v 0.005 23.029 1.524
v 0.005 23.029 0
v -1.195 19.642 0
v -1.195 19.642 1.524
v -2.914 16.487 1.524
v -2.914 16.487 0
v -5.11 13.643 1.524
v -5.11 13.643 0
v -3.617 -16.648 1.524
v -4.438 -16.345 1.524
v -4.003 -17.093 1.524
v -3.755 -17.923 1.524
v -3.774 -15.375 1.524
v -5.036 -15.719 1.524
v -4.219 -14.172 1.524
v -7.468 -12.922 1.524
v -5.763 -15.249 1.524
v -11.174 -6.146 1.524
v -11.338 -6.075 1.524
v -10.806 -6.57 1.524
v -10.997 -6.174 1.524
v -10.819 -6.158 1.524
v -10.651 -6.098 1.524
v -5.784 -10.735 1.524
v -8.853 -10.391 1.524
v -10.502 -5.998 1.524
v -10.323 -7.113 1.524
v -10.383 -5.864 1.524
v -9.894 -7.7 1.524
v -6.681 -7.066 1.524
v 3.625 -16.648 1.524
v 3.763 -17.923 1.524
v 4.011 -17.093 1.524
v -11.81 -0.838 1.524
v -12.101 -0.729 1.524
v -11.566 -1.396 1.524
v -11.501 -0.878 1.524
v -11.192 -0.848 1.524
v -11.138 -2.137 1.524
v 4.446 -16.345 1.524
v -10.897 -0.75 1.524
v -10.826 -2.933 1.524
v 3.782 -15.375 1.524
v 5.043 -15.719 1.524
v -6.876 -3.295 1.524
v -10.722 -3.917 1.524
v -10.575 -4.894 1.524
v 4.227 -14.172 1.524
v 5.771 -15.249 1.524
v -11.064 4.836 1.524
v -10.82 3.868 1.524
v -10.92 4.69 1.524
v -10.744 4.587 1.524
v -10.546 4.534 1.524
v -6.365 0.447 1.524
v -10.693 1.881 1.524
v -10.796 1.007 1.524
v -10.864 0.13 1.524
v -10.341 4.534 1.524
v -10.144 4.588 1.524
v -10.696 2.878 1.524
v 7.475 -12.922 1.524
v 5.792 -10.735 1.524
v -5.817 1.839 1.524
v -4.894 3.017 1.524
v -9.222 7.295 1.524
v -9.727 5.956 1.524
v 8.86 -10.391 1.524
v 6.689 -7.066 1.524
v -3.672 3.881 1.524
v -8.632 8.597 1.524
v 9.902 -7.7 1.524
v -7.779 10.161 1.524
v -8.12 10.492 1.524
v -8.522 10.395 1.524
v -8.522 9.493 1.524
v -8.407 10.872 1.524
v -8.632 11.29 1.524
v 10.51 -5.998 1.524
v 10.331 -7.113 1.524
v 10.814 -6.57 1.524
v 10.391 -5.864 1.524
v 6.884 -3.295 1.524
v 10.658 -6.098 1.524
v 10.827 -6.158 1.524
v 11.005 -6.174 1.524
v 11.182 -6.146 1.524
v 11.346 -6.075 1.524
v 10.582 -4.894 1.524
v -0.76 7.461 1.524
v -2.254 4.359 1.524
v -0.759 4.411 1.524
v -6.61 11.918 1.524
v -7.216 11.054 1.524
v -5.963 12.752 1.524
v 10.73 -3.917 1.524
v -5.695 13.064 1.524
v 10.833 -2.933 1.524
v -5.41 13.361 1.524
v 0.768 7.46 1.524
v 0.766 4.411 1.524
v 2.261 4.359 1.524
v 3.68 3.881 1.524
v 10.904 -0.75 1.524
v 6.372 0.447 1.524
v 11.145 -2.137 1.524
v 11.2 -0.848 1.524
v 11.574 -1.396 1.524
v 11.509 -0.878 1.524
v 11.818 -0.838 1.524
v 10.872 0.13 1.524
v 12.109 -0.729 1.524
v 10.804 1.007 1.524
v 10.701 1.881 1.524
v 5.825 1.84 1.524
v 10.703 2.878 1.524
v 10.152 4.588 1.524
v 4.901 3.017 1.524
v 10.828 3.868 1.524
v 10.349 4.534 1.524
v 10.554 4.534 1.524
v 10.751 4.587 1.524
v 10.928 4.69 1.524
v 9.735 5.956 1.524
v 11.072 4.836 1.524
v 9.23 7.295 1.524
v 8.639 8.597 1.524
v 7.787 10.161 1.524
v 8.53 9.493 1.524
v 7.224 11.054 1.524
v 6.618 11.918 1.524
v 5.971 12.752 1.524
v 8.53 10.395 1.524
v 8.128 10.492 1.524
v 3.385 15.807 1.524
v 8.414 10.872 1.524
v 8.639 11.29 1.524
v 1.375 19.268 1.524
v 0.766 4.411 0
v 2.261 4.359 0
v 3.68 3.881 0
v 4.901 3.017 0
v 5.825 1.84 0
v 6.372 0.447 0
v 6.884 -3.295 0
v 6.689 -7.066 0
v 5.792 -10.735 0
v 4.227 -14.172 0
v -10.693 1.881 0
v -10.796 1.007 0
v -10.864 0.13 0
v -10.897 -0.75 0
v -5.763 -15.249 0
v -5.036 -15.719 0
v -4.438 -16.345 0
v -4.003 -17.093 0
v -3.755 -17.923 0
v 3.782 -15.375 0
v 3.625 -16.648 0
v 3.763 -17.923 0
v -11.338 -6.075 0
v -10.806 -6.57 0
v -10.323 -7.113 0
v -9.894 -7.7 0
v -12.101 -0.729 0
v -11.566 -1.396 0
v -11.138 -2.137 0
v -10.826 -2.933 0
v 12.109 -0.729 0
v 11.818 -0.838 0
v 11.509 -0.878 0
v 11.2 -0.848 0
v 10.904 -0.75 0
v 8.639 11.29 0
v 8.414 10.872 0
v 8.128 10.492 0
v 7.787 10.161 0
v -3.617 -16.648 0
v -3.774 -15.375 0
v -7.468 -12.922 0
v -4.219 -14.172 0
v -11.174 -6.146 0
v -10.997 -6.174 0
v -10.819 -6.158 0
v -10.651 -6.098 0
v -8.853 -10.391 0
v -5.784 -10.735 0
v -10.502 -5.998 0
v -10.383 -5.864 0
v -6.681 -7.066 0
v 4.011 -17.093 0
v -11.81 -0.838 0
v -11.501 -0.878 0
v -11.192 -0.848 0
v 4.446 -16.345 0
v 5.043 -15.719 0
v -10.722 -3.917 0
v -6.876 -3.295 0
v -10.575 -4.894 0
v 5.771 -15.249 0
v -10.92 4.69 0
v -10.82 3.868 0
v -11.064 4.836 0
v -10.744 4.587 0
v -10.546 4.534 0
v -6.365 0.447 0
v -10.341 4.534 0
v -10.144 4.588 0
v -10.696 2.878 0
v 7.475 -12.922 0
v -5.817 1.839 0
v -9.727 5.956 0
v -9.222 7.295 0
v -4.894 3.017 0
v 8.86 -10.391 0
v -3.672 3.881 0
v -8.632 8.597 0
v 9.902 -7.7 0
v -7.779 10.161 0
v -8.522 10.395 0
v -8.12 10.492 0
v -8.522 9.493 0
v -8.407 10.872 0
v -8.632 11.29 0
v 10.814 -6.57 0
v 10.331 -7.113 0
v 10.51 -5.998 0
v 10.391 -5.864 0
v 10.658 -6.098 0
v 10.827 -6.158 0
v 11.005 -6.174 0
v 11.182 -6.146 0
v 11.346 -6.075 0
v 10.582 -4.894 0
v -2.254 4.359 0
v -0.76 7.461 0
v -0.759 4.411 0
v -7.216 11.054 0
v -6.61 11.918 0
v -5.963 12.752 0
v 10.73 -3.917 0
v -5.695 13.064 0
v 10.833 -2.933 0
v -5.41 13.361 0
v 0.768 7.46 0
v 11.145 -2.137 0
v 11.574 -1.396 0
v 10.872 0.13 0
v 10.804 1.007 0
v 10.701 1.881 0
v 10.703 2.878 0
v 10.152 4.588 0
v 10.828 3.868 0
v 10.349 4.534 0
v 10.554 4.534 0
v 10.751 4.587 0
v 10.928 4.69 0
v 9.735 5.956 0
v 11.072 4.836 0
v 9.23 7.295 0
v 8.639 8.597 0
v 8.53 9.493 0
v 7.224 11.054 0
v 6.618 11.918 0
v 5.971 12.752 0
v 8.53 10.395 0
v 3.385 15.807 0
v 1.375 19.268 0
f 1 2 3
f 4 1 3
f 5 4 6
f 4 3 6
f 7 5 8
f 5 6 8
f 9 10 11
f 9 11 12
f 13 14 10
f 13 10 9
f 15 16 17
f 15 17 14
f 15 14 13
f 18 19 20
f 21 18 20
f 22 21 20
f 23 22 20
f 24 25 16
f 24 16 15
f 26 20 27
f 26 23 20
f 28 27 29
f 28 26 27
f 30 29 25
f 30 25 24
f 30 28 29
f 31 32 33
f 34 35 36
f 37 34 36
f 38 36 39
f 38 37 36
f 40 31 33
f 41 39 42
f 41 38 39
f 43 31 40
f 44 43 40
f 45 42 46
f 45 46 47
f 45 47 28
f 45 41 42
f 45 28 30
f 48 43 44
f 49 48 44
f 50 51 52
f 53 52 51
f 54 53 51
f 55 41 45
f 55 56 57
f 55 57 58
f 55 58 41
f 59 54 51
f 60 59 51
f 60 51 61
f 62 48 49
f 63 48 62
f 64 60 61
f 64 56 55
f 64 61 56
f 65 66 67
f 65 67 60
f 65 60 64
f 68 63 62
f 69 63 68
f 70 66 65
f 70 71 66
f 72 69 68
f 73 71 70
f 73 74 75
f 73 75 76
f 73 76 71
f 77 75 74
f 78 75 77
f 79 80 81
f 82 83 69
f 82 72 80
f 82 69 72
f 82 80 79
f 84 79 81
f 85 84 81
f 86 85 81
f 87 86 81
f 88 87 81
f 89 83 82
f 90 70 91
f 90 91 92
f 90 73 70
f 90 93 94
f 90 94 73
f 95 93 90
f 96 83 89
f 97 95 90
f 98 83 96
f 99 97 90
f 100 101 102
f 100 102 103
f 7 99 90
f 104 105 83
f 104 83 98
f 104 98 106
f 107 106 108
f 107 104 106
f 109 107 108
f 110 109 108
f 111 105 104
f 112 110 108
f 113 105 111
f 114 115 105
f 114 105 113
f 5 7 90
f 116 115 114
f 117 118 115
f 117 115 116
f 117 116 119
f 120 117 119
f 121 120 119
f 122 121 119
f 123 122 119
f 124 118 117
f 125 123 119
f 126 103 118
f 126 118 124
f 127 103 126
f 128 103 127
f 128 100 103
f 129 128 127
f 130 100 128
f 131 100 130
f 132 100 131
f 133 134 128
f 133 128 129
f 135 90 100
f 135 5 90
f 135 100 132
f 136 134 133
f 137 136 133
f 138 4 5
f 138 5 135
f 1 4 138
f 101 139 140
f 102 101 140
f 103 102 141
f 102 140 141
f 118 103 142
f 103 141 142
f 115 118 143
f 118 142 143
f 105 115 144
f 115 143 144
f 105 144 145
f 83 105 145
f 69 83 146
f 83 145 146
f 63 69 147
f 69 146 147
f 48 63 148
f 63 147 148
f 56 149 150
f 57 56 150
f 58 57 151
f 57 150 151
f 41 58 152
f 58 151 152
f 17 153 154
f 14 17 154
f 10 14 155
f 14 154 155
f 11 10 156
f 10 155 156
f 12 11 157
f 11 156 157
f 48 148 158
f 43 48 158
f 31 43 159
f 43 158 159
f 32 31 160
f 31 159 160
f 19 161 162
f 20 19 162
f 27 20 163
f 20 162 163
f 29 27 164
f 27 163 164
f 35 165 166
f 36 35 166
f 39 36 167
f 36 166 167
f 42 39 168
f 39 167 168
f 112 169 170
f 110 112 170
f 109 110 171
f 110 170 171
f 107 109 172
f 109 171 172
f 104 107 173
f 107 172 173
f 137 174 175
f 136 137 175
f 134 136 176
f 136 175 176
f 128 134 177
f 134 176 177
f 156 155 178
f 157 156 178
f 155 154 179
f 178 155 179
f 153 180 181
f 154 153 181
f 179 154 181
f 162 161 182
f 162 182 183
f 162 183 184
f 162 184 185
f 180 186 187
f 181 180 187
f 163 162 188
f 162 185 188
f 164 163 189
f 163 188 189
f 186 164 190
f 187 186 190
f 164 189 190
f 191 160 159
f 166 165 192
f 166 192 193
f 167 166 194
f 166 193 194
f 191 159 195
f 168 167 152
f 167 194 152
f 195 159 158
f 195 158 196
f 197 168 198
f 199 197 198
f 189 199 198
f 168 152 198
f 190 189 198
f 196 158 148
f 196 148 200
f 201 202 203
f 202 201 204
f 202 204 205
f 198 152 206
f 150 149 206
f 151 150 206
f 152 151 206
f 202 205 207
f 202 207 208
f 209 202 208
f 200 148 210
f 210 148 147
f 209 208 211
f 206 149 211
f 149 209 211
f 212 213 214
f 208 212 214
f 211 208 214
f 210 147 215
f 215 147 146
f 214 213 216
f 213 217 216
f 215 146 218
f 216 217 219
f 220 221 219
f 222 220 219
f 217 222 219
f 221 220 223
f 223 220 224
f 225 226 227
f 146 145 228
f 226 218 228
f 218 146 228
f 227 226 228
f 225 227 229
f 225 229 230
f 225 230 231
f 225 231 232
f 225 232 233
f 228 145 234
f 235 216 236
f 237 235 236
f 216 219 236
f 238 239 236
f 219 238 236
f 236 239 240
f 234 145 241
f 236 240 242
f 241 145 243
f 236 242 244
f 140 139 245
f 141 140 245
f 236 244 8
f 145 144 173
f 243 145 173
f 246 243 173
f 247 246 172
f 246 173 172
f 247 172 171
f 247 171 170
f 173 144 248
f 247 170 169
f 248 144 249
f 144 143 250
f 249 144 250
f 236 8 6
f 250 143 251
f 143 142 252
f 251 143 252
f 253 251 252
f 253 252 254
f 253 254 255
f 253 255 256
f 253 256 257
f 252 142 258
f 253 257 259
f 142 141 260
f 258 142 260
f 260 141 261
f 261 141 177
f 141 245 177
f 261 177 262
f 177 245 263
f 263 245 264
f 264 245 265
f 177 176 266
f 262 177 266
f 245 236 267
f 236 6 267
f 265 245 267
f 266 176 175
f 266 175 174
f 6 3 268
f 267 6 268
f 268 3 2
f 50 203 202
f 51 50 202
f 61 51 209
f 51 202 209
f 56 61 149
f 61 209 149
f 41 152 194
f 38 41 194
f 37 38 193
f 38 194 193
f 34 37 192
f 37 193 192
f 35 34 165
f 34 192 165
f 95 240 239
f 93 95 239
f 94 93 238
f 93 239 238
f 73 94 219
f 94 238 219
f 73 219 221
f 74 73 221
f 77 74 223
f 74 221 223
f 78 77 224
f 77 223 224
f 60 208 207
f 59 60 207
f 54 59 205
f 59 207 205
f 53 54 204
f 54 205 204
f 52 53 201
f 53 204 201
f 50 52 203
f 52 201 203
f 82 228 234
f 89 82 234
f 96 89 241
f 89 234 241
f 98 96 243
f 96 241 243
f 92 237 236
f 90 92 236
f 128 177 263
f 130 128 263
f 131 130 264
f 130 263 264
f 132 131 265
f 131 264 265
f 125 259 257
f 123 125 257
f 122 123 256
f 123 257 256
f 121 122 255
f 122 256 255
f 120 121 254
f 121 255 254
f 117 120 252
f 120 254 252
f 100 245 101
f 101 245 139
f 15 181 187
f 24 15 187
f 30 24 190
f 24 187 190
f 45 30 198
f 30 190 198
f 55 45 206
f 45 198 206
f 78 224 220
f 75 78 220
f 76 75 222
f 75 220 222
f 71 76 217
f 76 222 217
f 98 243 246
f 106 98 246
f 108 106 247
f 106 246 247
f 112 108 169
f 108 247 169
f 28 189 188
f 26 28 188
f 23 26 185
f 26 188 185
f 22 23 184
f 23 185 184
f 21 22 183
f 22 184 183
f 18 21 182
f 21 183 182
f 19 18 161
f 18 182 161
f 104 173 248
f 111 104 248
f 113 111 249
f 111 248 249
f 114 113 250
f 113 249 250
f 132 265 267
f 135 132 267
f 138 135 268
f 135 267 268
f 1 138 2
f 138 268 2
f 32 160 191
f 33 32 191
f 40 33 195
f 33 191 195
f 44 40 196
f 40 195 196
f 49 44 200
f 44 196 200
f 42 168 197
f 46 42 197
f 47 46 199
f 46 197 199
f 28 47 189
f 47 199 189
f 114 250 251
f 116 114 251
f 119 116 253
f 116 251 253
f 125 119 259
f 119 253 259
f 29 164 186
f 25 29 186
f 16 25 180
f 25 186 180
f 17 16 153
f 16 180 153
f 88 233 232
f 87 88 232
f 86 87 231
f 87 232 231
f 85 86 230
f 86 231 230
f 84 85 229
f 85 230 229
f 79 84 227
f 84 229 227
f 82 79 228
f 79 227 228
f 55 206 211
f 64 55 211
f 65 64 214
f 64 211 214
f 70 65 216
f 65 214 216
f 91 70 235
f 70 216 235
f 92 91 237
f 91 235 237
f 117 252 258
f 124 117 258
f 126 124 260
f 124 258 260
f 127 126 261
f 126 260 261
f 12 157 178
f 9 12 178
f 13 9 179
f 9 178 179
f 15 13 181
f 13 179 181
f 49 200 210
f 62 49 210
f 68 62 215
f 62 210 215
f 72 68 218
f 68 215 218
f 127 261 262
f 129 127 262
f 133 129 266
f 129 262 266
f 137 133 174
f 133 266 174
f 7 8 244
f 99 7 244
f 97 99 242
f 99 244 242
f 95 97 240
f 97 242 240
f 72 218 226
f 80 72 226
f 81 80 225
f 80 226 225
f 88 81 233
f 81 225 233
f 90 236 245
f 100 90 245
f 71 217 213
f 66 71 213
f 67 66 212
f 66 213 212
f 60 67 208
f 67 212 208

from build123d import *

# Parameters (mm, degrees)
BOSS_EXTRUDE1_DEPTH = 1.524


with BuildPart() as part:
    # Sketch1 → Boss-Extrude1 (new body)
    with BuildSketch(Plane.XY):
        with BuildLine():
            Line((-0.760070899, 7.460977954), (0.767897128, 7.459984541))
            Line((0.767897128, 7.459984541), (0.765910301, 4.411002891))
            ThreePointArc((0.765910301, 4.411002891), (4.32194984, 3.493667889), (6.372371333, 0.446916765))
            ThreePointArc((6.372371333, 0.446916765), (6.688594723, -7.066471539), (4.226511646, -14.172043153))
            ThreePointArc((4.226511646, -14.172043153), (3.666960455, -16.006802716), (3.76324428, -17.922571391))
            ThreePointArc((3.76324428, -17.922571391), (4.445796565, -16.344729964), (5.770776644, -15.249335522))
            ThreePointArc((5.770776644, -15.249335522), (8.209412547, -11.678891072), (9.901915798, -7.700141093))
            ThreePointArc((9.901915798, -7.700141093), (10.56591512, -6.836092284), (11.345730748, -6.07493328))
            ThreePointArc((11.345730748, -6.07493328), (10.826887202, -6.157946188), (10.391178227, -5.864267011))
            ThreePointArc((10.391178227, -5.864267011), (10.661740328, -4.406185462), (10.833367262, -2.933178384))
            ThreePointArc((10.833367262, -2.933178384), (11.345730748, -1.758358454), (12.109295167, -0.728947171))
            ThreePointArc((12.109295167, -0.728947171), (11.509245819, -0.877984338), (10.904429696, -0.749653693))
            ThreePointArc((10.904429696, -0.749653693), (10.842155911, 0.568514134), (10.700889839, 1.880569141))
            ThreePointArc((10.700889839, 1.880569141), (10.750460558, 3.375199082), (11.072247287, 4.835619986))
            ThreePointArc((11.072247287, 4.835619986), (10.654347315, 4.554276024), (10.151679138, 4.587735186))
            ThreePointArc((10.151679138, 4.587735186), (9.493497129, 6.629427415), (8.639426453, 8.597236857))
            ThreePointArc((8.639426453, 8.597236857), (8.516035962, 9.943618933), (8.639426453, 11.29000101))
            ThreePointArc((8.639426453, 11.29000101), (8.278476637, 10.67654613), (7.787243967, 10.161471258))
            ThreePointArc((7.787243967, 10.161471258), (6.925869801, 11.489539462), (5.971147131, 12.752169745))
            ThreePointArc((5.971147131, 12.752169745), (2.303316115, 17.492889529), (0.004783201, 23.028605823))
            ThreePointArc((0.004783201, 23.028605823), (-1.992221452, 18.030222496), (-5.110354293, 13.642841609))
            ThreePointArc((-5.110354293, 13.642841609), (-5.554708445, 13.214619989), (-5.963320902, 12.752169745))
            ThreePointArc((-5.963320902, 12.752169745), (-6.918043572, 11.489539462), (-7.779417738, 10.161471258))
            ThreePointArc((-7.779417738, 10.161471258), (-8.270650408, 10.67654613), (-8.631600224, 11.29000101))
            ThreePointArc((-8.631600224, 11.29000101), (-8.508209733, 9.943618933), (-8.631600224, 8.597236857))
            ThreePointArc((-8.631600224, 8.597236857), (-9.4856709, 6.629427415), (-10.14385291, 4.587735186))
            ThreePointArc((-10.14385291, 4.587735186), (-10.646521087, 4.554276024), (-11.064421059, 4.835619986))
            ThreePointArc((-11.064421059, 4.835619986), (-10.742634329, 3.375199082), (-10.69306361, 1.880569141))
            ThreePointArc((-10.69306361, 1.880569141), (-10.834329682, 0.568514134), (-10.896603467, -0.749653693))
            ThreePointArc((-10.896603467, -0.749653693), (-11.50141959, -0.877984338), (-12.101468938, -0.728947171))
            ThreePointArc((-12.101468938, -0.728947171), (-11.33790452, -1.758358454), (-10.825541034, -2.933178384))
            ThreePointArc((-10.825541034, -2.933178384), (-10.653914099, -4.406185462), (-10.383351998, -5.864267011))
            ThreePointArc((-10.383351998, -5.864267011), (-10.819060973, -6.157946188), (-11.33790452, -6.07493328))
            ThreePointArc((-11.33790452, -6.07493328), (-10.558088891, -6.836092284), (-9.894089569, -7.700141093))
            ThreePointArc((-9.894089569, -7.700141093), (-8.201586318, -11.678891072), (-5.762950415, -15.249335522))
            ThreePointArc((-5.762950415, -15.249335522), (-4.437970336, -16.344729964), (-3.755418051, -17.922571391))
            ThreePointArc((-3.755418051, -17.922571391), (-3.659134226, -16.006802716), (-4.218685417, -14.172043153))
            ThreePointArc((-4.218685417, -14.172043153), (-6.680768494, -7.066471539), (-6.364545104, 0.446916765))
            ThreePointArc((-6.364545104, 0.446916765), (-4.314549444, 3.493366768), (-0.759120805, 4.411117837))
            Line((-0.759120805, 4.411117837), (-0.760070899, 7.460977954))
        make_face()
    extrude(amount=BOSS_EXTRUDE1_DEPTH)


solid = part.part
